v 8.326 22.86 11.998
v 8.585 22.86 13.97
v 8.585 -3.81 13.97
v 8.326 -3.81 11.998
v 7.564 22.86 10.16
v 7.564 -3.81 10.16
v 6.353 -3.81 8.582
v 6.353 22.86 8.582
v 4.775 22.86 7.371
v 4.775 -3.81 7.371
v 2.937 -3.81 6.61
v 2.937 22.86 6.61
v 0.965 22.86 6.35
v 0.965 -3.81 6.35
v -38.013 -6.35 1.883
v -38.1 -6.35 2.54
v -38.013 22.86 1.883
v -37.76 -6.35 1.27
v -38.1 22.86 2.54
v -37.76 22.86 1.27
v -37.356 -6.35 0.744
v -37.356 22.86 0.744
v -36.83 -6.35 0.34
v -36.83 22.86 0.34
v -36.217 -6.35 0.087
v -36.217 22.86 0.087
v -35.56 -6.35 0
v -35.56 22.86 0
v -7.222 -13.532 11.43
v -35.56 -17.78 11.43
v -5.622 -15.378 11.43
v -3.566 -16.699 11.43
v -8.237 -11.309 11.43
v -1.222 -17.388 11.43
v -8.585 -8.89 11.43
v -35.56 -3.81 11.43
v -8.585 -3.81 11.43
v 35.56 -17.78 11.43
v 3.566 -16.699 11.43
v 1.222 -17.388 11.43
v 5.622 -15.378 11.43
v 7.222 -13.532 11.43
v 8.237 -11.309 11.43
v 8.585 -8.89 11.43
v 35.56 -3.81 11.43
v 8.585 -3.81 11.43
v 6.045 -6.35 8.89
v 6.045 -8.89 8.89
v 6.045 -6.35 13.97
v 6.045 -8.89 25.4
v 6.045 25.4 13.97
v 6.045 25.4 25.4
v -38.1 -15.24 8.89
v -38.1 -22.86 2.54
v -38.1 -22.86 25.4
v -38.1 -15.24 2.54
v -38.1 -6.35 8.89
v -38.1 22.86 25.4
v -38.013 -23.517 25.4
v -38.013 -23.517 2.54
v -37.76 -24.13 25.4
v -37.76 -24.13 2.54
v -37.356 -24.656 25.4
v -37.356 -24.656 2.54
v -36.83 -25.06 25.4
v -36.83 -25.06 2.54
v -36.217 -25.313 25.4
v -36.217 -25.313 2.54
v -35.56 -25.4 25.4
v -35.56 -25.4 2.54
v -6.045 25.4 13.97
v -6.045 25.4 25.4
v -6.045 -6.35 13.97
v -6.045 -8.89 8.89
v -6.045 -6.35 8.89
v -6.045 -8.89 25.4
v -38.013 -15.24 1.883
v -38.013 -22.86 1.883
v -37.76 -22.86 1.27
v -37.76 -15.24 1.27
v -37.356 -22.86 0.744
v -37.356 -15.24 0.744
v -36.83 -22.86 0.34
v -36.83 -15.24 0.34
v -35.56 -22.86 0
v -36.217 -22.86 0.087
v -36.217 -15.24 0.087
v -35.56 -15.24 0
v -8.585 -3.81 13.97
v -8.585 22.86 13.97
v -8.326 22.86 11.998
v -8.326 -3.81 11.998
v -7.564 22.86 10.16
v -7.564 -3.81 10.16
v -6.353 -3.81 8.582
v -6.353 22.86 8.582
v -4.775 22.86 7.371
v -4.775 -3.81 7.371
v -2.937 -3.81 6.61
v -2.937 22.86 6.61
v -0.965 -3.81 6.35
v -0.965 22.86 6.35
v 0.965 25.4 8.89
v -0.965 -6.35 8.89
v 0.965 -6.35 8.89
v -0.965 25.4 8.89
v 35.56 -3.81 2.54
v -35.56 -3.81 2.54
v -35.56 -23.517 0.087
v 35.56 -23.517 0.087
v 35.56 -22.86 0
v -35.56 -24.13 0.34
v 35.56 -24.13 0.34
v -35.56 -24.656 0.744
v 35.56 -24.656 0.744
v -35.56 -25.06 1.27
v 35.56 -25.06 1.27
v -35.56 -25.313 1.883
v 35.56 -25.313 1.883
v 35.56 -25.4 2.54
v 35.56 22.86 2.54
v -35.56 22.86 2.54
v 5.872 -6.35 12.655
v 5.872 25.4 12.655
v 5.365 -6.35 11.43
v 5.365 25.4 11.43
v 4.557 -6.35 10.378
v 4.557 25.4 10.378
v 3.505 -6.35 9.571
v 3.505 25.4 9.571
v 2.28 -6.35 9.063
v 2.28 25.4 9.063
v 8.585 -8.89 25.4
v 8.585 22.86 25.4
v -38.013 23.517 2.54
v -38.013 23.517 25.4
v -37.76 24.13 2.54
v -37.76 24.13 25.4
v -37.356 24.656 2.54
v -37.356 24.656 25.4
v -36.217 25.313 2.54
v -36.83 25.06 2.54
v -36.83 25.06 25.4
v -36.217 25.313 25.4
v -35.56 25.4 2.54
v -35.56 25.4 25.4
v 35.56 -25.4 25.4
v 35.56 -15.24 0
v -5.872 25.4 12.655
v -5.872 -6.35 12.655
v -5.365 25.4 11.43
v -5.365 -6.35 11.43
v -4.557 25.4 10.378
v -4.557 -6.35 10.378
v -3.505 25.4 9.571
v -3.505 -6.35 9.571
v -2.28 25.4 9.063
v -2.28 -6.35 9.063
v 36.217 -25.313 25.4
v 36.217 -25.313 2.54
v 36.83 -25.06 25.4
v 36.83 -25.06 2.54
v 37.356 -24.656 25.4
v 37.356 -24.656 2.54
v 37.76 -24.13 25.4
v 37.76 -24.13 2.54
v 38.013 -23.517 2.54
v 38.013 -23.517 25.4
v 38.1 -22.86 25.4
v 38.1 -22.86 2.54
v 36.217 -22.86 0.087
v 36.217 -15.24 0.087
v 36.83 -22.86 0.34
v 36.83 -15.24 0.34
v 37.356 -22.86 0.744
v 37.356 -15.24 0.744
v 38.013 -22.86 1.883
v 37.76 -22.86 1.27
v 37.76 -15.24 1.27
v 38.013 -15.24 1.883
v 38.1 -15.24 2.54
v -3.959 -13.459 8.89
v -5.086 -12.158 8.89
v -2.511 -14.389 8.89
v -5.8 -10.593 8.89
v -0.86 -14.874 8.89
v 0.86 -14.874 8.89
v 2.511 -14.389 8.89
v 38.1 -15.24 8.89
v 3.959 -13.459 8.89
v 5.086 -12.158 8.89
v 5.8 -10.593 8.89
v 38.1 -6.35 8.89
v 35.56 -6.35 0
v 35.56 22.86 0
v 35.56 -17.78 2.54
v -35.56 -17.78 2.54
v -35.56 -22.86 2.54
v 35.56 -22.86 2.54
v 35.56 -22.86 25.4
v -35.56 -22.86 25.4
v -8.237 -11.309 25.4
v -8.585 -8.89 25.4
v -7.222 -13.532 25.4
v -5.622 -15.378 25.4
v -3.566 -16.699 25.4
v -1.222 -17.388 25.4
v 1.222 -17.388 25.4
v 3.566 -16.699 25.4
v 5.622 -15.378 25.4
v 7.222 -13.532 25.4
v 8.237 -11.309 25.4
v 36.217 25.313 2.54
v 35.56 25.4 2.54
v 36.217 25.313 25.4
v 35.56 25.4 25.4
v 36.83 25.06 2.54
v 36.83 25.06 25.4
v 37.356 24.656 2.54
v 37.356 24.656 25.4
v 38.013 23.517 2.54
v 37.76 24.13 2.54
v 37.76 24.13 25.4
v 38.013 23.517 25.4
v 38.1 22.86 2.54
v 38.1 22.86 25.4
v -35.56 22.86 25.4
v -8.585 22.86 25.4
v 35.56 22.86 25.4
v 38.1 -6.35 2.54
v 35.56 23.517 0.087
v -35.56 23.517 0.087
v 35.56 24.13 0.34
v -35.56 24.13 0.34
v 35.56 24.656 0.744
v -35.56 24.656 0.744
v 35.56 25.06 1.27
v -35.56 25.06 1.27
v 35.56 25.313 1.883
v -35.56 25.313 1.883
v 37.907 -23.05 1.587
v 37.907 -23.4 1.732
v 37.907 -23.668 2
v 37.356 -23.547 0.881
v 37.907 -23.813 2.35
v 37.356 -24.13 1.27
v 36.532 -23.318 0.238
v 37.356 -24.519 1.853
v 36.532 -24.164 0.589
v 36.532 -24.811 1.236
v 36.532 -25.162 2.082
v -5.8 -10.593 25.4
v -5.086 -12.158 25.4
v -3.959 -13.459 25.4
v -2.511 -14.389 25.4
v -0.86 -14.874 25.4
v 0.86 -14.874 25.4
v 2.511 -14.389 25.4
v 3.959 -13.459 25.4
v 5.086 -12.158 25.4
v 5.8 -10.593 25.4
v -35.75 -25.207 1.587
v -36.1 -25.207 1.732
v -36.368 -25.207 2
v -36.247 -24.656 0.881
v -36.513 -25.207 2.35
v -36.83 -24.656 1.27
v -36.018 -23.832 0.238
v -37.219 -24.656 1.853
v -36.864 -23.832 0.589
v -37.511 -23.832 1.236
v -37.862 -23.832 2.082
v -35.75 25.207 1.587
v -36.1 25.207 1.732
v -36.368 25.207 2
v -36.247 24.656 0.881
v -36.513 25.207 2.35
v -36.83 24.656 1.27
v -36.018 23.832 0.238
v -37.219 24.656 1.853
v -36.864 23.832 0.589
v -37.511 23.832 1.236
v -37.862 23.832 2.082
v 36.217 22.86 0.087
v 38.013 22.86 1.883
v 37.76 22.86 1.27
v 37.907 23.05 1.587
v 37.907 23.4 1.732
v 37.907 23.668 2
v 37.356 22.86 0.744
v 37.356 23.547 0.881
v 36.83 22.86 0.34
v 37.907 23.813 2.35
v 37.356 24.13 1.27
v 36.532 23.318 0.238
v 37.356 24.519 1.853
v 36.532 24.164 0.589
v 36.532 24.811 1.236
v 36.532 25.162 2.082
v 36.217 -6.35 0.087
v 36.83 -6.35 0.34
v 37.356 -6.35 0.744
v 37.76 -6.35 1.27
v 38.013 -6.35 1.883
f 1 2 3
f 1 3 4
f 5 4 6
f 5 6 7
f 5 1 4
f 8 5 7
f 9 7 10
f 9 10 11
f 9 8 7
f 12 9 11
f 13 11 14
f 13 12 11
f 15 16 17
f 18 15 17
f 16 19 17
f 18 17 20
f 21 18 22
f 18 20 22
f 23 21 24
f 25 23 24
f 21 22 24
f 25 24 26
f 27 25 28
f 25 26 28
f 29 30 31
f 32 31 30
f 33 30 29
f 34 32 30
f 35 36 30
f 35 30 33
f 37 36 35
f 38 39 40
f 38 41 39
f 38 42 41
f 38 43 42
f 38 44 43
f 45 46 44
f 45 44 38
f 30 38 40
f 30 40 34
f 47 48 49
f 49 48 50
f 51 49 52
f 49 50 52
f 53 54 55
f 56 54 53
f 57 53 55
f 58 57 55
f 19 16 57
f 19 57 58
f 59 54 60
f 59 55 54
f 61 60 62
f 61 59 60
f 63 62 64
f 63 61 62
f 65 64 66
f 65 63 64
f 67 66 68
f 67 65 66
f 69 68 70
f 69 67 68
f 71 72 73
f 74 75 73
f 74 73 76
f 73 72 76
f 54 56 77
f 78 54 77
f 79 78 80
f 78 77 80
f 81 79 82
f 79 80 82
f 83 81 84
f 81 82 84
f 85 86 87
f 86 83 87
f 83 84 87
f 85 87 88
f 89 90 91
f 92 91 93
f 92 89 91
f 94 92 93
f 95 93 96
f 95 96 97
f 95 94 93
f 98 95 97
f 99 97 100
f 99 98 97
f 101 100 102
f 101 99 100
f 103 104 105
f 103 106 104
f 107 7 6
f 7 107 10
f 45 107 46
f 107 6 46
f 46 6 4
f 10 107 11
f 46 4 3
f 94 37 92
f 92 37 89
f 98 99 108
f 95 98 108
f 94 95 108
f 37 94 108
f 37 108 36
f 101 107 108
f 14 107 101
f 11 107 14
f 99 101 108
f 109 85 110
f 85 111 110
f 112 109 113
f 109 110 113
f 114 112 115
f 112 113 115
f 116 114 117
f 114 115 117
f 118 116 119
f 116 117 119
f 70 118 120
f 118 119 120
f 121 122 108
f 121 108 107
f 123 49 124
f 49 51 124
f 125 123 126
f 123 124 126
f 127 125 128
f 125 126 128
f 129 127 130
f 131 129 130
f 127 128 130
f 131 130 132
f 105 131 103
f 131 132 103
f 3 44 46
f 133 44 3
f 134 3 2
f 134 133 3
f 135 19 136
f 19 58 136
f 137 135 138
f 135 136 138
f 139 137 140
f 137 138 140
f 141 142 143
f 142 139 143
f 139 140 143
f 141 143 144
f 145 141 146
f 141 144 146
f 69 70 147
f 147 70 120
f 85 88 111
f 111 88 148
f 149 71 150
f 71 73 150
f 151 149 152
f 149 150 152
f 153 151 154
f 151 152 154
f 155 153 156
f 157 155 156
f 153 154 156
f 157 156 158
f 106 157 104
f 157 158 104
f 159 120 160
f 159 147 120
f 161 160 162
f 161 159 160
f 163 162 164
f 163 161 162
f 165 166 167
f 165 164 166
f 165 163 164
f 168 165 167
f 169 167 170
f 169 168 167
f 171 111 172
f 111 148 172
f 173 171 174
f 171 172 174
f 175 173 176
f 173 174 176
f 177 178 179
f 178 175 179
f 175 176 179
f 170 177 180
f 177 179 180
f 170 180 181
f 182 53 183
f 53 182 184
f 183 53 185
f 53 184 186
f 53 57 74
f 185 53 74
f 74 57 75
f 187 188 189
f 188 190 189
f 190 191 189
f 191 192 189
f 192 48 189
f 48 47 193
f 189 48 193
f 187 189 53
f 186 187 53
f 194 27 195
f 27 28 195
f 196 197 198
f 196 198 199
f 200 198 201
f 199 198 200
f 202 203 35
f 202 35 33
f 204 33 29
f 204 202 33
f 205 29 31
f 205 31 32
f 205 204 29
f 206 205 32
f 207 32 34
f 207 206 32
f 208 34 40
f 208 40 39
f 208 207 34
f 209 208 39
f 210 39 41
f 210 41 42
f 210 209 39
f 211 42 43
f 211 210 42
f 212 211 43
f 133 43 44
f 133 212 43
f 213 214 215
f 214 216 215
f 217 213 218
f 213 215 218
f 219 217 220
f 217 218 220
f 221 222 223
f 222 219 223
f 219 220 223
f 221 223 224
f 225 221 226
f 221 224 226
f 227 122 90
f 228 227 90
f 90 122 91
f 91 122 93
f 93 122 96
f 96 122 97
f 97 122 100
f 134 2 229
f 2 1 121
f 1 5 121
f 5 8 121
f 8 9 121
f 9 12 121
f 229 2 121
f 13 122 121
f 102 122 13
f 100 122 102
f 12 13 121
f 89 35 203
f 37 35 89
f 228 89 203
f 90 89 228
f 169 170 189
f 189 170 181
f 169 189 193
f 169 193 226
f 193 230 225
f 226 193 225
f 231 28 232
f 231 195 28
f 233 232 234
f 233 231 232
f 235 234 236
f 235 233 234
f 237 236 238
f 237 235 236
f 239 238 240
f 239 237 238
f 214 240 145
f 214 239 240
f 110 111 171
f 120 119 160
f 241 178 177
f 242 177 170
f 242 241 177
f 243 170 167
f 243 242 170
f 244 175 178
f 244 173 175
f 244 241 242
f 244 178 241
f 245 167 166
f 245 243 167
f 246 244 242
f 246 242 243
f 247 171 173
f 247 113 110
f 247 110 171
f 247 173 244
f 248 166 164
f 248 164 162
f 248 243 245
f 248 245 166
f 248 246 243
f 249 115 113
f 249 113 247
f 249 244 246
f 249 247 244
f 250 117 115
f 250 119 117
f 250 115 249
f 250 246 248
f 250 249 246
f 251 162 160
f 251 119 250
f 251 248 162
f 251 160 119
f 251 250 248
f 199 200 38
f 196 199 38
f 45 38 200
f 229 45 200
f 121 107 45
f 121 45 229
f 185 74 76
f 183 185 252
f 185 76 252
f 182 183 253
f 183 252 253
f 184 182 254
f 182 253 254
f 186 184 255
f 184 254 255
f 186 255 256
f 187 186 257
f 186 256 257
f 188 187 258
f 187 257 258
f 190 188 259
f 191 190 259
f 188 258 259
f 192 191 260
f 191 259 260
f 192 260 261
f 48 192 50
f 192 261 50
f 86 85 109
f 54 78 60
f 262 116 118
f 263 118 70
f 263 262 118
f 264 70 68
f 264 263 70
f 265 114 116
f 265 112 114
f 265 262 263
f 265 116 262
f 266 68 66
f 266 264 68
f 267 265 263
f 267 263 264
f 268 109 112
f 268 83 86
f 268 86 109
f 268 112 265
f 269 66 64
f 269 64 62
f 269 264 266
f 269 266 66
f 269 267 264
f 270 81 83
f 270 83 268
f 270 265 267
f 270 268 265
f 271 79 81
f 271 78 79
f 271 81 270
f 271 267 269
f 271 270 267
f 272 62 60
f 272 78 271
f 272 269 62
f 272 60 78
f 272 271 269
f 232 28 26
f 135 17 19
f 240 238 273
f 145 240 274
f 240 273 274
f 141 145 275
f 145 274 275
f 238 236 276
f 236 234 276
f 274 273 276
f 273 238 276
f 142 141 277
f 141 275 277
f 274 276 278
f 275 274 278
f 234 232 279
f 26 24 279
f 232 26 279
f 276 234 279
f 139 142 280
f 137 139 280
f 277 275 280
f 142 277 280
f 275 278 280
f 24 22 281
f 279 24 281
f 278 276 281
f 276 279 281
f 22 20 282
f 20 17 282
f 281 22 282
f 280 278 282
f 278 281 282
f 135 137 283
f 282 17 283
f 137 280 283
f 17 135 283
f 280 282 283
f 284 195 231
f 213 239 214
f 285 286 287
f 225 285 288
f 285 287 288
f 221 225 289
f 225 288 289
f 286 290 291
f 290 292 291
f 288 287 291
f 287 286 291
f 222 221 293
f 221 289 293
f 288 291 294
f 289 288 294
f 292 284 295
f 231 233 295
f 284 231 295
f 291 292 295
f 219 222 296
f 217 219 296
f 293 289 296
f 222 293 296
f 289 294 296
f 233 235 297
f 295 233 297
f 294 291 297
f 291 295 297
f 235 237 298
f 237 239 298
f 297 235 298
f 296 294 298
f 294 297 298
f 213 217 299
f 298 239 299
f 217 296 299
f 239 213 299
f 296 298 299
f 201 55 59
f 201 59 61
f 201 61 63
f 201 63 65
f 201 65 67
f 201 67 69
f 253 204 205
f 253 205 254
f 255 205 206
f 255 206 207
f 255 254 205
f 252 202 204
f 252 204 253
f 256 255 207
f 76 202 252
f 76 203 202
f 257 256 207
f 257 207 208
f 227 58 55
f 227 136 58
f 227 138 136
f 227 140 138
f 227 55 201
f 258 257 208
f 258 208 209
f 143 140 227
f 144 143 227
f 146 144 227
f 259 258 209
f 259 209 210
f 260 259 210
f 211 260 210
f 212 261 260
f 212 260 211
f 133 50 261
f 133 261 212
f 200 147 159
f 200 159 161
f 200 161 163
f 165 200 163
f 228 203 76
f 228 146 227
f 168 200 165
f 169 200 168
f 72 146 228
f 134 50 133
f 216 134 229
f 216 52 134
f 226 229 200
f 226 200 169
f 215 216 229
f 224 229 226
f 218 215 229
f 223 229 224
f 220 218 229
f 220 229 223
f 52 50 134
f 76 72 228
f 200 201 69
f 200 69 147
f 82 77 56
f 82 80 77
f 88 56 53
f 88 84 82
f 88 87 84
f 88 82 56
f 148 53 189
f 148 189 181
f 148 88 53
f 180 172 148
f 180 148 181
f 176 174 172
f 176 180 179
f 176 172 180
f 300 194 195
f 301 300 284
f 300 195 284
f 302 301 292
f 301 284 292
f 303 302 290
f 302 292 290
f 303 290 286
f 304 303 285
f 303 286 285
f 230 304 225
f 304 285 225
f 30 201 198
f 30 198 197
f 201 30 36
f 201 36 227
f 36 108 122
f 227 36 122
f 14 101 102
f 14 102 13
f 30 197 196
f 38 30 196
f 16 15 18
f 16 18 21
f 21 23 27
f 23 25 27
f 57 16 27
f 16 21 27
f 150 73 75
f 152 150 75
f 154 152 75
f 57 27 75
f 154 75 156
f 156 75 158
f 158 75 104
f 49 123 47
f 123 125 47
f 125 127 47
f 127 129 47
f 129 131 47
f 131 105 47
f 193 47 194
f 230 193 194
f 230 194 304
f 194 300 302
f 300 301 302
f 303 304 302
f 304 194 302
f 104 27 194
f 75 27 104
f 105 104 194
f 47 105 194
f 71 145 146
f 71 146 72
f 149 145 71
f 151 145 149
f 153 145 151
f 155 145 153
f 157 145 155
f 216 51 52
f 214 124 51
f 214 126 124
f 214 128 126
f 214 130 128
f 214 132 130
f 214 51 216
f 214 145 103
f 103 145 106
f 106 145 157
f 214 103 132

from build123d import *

# Parameters (mm, degrees)
F0_W        = 76.2
F0_H        = 50.8
F2_DEPTH    = 25.4
F1_W        = 76.2
F1_H        = 8.89
F3_DEPTH    = 8.89
F4_R        = 2.54
F6_DEPTH    = 16.51
F7_R        = 5.08
F8_T        = 2.54
F8_T3_DEPTH = 10.16
F8_T5_DEPTH = 37.1348
F8_T7_DEPTH = 37.1348
F8_T9_DEPTH = 81.28


# Not quite as in the source:
# - a shell that OpenCascade refuses in one call is made with other operations: the cavity is built on its own and cut out


with BuildPart() as f2:
    # F0 (on Top) → F2 (new body)
    with BuildSketch(Plane.XY):
        Rectangle(F0_W, F0_H)
    extrude(amount=F2_DEPTH)

    # F1 (on face) → F3 (cut)
    with BuildSketch(Plane.XY):
        with Locations((0, -10.795)):
            Rectangle(F1_W, F1_H)
    extrude(amount=F3_DEPTH, mode=Mode.SUBTRACT)

    # F4
    f4_edges = [f2.edges().sort_by_distance(p)[0] for p in [
        (-38.1, 9.525, 0),
        (0, 25.4, 0),
        (38.1, 9.525, 0),
        (-38.1, -20.32, 0),
        (0, -25.4, 0),
        (38.1, -20.32, 0),
        (-38.1, 25.4, 12.7),
        (-38.1, -25.4, 12.7),
        (38.1, -25.4, 12.7),
        (38.1, 25.4, 12.7),
    ]]
    fillet(f4_edges, radius=F4_R)

    # F5 (on face) → F6 (cut, through all)
    with BuildSketch(Plane.XY.offset(25.4)):
        Polygon((6.0452, 25.4), (-6.0452, 25.4), (-6.0452, -6.35), (-6.0452, -8.89), (6.0452, -8.89), (6.0452, -6.35), align=None)
        with BuildLine():
            Line((6.0452, -8.89), (-6.0452, -8.89))
            ThreePointArc((-6.0452, -8.89), (0, -14.9352), (6.0452, -8.89))
        make_face()
    extrude(amount=-F6_DEPTH, mode=Mode.SUBTRACT)

    # F7
    f7_edges = [f2.edges().sort_by_distance(p)[0] for p in [
        (-6.0452, 9.525, 8.89),
        (6.0452, 9.525, 8.89),
    ]]
    fillet(f7_edges, radius=F7_R)

    # F8: shell of thickness 2.54, made by hand


with BuildPart() as f8_core1:
    # F8_t2: copy of F2
    add(f2.part)

    # the walls: a layer under each face that stays
    f8_faces = [f8_core1.faces().sort_by_distance(p)[0] for p in [
        (23.7066666667, 25.4, 21.59),
        (-6.0452, 8.255, 17.145),
        (-4.5573024484, 9.525, 10.3778975516),
        (0, 9.525, 8.89),
        (4.5573024484, 9.525, 10.3778975516),
        (6.0452, 8.255, 17.145),
        (0, -6.35, 6.985),
        (0, -14.9352, 17.145),
        (-25.4, -13.7583333333, 8.89),
        (38.1, 0, 13.97),
        (0, -25.4, 13.97),
        (-38.1, 0, 13.97),
        (0, 8.255, 0),
        (0, -15.24, 4.445),
        (0, -19.05, 0),
    ]]
    thicken(f8_faces, amount=-F8_T, mode=Mode.SUBTRACT)

    # F8_s4 → F8_t3 (cut)
    with BuildSketch(Plane.XY.offset(6.35)):
        Polygon((-6.0198, -6.3754), (-8.5852, -6.35), (-8.5852, -3.81), (-6.0452, -3.81), align=None)
        Polygon((6.0198, -6.3754), (8.5852, -6.35), (8.5852, -3.81), (6.0452, -3.81), align=None)
    extrude(amount=F8_T3_DEPTH, mode=Mode.SUBTRACT)

    # F8_s6 → F8_t5 (cut)
    with BuildSketch(Plane.YZ.offset(3.5052)):
        Polygon((-6.3754, 8.8646), (-3.81, 8.89), (-3.81, 11.43), (-6.35, 11.43), align=None)
    extrude(amount=F8_T5_DEPTH, mode=Mode.SUBTRACT)

    # F8_s8 → F8_t7 (cut)
    with BuildSketch(Plane.YZ.offset(-40.64)):
        Polygon((-6.3754, 8.8646), (-3.81, 8.89), (-3.81, 11.43), (-6.35, 11.43), align=None)
    extrude(amount=F8_T7_DEPTH, mode=Mode.SUBTRACT)

    # F8_s10 → F8_t9 (cut)
    with BuildSketch(Plane.YZ.offset(-40.64)):
        Polygon((-15.2146, 8.8646), (-15.24, 11.43), (-17.78, 11.43), (-17.78, 8.89), align=None)
    extrude(amount=F8_T9_DEPTH, mode=Mode.SUBTRACT)


with BuildPart() as f2_1:
    add(f2.part)

    # what is left inside the walls is the cavity
    f8_cavity = [f8_core1.part.solids().sort_by_distance(p)[0] for p in [
        (-17.78, 7.62, 25.3746),
    ]]
    add(f8_cavity, mode=Mode.SUBTRACT)


solid = f2_1.part
